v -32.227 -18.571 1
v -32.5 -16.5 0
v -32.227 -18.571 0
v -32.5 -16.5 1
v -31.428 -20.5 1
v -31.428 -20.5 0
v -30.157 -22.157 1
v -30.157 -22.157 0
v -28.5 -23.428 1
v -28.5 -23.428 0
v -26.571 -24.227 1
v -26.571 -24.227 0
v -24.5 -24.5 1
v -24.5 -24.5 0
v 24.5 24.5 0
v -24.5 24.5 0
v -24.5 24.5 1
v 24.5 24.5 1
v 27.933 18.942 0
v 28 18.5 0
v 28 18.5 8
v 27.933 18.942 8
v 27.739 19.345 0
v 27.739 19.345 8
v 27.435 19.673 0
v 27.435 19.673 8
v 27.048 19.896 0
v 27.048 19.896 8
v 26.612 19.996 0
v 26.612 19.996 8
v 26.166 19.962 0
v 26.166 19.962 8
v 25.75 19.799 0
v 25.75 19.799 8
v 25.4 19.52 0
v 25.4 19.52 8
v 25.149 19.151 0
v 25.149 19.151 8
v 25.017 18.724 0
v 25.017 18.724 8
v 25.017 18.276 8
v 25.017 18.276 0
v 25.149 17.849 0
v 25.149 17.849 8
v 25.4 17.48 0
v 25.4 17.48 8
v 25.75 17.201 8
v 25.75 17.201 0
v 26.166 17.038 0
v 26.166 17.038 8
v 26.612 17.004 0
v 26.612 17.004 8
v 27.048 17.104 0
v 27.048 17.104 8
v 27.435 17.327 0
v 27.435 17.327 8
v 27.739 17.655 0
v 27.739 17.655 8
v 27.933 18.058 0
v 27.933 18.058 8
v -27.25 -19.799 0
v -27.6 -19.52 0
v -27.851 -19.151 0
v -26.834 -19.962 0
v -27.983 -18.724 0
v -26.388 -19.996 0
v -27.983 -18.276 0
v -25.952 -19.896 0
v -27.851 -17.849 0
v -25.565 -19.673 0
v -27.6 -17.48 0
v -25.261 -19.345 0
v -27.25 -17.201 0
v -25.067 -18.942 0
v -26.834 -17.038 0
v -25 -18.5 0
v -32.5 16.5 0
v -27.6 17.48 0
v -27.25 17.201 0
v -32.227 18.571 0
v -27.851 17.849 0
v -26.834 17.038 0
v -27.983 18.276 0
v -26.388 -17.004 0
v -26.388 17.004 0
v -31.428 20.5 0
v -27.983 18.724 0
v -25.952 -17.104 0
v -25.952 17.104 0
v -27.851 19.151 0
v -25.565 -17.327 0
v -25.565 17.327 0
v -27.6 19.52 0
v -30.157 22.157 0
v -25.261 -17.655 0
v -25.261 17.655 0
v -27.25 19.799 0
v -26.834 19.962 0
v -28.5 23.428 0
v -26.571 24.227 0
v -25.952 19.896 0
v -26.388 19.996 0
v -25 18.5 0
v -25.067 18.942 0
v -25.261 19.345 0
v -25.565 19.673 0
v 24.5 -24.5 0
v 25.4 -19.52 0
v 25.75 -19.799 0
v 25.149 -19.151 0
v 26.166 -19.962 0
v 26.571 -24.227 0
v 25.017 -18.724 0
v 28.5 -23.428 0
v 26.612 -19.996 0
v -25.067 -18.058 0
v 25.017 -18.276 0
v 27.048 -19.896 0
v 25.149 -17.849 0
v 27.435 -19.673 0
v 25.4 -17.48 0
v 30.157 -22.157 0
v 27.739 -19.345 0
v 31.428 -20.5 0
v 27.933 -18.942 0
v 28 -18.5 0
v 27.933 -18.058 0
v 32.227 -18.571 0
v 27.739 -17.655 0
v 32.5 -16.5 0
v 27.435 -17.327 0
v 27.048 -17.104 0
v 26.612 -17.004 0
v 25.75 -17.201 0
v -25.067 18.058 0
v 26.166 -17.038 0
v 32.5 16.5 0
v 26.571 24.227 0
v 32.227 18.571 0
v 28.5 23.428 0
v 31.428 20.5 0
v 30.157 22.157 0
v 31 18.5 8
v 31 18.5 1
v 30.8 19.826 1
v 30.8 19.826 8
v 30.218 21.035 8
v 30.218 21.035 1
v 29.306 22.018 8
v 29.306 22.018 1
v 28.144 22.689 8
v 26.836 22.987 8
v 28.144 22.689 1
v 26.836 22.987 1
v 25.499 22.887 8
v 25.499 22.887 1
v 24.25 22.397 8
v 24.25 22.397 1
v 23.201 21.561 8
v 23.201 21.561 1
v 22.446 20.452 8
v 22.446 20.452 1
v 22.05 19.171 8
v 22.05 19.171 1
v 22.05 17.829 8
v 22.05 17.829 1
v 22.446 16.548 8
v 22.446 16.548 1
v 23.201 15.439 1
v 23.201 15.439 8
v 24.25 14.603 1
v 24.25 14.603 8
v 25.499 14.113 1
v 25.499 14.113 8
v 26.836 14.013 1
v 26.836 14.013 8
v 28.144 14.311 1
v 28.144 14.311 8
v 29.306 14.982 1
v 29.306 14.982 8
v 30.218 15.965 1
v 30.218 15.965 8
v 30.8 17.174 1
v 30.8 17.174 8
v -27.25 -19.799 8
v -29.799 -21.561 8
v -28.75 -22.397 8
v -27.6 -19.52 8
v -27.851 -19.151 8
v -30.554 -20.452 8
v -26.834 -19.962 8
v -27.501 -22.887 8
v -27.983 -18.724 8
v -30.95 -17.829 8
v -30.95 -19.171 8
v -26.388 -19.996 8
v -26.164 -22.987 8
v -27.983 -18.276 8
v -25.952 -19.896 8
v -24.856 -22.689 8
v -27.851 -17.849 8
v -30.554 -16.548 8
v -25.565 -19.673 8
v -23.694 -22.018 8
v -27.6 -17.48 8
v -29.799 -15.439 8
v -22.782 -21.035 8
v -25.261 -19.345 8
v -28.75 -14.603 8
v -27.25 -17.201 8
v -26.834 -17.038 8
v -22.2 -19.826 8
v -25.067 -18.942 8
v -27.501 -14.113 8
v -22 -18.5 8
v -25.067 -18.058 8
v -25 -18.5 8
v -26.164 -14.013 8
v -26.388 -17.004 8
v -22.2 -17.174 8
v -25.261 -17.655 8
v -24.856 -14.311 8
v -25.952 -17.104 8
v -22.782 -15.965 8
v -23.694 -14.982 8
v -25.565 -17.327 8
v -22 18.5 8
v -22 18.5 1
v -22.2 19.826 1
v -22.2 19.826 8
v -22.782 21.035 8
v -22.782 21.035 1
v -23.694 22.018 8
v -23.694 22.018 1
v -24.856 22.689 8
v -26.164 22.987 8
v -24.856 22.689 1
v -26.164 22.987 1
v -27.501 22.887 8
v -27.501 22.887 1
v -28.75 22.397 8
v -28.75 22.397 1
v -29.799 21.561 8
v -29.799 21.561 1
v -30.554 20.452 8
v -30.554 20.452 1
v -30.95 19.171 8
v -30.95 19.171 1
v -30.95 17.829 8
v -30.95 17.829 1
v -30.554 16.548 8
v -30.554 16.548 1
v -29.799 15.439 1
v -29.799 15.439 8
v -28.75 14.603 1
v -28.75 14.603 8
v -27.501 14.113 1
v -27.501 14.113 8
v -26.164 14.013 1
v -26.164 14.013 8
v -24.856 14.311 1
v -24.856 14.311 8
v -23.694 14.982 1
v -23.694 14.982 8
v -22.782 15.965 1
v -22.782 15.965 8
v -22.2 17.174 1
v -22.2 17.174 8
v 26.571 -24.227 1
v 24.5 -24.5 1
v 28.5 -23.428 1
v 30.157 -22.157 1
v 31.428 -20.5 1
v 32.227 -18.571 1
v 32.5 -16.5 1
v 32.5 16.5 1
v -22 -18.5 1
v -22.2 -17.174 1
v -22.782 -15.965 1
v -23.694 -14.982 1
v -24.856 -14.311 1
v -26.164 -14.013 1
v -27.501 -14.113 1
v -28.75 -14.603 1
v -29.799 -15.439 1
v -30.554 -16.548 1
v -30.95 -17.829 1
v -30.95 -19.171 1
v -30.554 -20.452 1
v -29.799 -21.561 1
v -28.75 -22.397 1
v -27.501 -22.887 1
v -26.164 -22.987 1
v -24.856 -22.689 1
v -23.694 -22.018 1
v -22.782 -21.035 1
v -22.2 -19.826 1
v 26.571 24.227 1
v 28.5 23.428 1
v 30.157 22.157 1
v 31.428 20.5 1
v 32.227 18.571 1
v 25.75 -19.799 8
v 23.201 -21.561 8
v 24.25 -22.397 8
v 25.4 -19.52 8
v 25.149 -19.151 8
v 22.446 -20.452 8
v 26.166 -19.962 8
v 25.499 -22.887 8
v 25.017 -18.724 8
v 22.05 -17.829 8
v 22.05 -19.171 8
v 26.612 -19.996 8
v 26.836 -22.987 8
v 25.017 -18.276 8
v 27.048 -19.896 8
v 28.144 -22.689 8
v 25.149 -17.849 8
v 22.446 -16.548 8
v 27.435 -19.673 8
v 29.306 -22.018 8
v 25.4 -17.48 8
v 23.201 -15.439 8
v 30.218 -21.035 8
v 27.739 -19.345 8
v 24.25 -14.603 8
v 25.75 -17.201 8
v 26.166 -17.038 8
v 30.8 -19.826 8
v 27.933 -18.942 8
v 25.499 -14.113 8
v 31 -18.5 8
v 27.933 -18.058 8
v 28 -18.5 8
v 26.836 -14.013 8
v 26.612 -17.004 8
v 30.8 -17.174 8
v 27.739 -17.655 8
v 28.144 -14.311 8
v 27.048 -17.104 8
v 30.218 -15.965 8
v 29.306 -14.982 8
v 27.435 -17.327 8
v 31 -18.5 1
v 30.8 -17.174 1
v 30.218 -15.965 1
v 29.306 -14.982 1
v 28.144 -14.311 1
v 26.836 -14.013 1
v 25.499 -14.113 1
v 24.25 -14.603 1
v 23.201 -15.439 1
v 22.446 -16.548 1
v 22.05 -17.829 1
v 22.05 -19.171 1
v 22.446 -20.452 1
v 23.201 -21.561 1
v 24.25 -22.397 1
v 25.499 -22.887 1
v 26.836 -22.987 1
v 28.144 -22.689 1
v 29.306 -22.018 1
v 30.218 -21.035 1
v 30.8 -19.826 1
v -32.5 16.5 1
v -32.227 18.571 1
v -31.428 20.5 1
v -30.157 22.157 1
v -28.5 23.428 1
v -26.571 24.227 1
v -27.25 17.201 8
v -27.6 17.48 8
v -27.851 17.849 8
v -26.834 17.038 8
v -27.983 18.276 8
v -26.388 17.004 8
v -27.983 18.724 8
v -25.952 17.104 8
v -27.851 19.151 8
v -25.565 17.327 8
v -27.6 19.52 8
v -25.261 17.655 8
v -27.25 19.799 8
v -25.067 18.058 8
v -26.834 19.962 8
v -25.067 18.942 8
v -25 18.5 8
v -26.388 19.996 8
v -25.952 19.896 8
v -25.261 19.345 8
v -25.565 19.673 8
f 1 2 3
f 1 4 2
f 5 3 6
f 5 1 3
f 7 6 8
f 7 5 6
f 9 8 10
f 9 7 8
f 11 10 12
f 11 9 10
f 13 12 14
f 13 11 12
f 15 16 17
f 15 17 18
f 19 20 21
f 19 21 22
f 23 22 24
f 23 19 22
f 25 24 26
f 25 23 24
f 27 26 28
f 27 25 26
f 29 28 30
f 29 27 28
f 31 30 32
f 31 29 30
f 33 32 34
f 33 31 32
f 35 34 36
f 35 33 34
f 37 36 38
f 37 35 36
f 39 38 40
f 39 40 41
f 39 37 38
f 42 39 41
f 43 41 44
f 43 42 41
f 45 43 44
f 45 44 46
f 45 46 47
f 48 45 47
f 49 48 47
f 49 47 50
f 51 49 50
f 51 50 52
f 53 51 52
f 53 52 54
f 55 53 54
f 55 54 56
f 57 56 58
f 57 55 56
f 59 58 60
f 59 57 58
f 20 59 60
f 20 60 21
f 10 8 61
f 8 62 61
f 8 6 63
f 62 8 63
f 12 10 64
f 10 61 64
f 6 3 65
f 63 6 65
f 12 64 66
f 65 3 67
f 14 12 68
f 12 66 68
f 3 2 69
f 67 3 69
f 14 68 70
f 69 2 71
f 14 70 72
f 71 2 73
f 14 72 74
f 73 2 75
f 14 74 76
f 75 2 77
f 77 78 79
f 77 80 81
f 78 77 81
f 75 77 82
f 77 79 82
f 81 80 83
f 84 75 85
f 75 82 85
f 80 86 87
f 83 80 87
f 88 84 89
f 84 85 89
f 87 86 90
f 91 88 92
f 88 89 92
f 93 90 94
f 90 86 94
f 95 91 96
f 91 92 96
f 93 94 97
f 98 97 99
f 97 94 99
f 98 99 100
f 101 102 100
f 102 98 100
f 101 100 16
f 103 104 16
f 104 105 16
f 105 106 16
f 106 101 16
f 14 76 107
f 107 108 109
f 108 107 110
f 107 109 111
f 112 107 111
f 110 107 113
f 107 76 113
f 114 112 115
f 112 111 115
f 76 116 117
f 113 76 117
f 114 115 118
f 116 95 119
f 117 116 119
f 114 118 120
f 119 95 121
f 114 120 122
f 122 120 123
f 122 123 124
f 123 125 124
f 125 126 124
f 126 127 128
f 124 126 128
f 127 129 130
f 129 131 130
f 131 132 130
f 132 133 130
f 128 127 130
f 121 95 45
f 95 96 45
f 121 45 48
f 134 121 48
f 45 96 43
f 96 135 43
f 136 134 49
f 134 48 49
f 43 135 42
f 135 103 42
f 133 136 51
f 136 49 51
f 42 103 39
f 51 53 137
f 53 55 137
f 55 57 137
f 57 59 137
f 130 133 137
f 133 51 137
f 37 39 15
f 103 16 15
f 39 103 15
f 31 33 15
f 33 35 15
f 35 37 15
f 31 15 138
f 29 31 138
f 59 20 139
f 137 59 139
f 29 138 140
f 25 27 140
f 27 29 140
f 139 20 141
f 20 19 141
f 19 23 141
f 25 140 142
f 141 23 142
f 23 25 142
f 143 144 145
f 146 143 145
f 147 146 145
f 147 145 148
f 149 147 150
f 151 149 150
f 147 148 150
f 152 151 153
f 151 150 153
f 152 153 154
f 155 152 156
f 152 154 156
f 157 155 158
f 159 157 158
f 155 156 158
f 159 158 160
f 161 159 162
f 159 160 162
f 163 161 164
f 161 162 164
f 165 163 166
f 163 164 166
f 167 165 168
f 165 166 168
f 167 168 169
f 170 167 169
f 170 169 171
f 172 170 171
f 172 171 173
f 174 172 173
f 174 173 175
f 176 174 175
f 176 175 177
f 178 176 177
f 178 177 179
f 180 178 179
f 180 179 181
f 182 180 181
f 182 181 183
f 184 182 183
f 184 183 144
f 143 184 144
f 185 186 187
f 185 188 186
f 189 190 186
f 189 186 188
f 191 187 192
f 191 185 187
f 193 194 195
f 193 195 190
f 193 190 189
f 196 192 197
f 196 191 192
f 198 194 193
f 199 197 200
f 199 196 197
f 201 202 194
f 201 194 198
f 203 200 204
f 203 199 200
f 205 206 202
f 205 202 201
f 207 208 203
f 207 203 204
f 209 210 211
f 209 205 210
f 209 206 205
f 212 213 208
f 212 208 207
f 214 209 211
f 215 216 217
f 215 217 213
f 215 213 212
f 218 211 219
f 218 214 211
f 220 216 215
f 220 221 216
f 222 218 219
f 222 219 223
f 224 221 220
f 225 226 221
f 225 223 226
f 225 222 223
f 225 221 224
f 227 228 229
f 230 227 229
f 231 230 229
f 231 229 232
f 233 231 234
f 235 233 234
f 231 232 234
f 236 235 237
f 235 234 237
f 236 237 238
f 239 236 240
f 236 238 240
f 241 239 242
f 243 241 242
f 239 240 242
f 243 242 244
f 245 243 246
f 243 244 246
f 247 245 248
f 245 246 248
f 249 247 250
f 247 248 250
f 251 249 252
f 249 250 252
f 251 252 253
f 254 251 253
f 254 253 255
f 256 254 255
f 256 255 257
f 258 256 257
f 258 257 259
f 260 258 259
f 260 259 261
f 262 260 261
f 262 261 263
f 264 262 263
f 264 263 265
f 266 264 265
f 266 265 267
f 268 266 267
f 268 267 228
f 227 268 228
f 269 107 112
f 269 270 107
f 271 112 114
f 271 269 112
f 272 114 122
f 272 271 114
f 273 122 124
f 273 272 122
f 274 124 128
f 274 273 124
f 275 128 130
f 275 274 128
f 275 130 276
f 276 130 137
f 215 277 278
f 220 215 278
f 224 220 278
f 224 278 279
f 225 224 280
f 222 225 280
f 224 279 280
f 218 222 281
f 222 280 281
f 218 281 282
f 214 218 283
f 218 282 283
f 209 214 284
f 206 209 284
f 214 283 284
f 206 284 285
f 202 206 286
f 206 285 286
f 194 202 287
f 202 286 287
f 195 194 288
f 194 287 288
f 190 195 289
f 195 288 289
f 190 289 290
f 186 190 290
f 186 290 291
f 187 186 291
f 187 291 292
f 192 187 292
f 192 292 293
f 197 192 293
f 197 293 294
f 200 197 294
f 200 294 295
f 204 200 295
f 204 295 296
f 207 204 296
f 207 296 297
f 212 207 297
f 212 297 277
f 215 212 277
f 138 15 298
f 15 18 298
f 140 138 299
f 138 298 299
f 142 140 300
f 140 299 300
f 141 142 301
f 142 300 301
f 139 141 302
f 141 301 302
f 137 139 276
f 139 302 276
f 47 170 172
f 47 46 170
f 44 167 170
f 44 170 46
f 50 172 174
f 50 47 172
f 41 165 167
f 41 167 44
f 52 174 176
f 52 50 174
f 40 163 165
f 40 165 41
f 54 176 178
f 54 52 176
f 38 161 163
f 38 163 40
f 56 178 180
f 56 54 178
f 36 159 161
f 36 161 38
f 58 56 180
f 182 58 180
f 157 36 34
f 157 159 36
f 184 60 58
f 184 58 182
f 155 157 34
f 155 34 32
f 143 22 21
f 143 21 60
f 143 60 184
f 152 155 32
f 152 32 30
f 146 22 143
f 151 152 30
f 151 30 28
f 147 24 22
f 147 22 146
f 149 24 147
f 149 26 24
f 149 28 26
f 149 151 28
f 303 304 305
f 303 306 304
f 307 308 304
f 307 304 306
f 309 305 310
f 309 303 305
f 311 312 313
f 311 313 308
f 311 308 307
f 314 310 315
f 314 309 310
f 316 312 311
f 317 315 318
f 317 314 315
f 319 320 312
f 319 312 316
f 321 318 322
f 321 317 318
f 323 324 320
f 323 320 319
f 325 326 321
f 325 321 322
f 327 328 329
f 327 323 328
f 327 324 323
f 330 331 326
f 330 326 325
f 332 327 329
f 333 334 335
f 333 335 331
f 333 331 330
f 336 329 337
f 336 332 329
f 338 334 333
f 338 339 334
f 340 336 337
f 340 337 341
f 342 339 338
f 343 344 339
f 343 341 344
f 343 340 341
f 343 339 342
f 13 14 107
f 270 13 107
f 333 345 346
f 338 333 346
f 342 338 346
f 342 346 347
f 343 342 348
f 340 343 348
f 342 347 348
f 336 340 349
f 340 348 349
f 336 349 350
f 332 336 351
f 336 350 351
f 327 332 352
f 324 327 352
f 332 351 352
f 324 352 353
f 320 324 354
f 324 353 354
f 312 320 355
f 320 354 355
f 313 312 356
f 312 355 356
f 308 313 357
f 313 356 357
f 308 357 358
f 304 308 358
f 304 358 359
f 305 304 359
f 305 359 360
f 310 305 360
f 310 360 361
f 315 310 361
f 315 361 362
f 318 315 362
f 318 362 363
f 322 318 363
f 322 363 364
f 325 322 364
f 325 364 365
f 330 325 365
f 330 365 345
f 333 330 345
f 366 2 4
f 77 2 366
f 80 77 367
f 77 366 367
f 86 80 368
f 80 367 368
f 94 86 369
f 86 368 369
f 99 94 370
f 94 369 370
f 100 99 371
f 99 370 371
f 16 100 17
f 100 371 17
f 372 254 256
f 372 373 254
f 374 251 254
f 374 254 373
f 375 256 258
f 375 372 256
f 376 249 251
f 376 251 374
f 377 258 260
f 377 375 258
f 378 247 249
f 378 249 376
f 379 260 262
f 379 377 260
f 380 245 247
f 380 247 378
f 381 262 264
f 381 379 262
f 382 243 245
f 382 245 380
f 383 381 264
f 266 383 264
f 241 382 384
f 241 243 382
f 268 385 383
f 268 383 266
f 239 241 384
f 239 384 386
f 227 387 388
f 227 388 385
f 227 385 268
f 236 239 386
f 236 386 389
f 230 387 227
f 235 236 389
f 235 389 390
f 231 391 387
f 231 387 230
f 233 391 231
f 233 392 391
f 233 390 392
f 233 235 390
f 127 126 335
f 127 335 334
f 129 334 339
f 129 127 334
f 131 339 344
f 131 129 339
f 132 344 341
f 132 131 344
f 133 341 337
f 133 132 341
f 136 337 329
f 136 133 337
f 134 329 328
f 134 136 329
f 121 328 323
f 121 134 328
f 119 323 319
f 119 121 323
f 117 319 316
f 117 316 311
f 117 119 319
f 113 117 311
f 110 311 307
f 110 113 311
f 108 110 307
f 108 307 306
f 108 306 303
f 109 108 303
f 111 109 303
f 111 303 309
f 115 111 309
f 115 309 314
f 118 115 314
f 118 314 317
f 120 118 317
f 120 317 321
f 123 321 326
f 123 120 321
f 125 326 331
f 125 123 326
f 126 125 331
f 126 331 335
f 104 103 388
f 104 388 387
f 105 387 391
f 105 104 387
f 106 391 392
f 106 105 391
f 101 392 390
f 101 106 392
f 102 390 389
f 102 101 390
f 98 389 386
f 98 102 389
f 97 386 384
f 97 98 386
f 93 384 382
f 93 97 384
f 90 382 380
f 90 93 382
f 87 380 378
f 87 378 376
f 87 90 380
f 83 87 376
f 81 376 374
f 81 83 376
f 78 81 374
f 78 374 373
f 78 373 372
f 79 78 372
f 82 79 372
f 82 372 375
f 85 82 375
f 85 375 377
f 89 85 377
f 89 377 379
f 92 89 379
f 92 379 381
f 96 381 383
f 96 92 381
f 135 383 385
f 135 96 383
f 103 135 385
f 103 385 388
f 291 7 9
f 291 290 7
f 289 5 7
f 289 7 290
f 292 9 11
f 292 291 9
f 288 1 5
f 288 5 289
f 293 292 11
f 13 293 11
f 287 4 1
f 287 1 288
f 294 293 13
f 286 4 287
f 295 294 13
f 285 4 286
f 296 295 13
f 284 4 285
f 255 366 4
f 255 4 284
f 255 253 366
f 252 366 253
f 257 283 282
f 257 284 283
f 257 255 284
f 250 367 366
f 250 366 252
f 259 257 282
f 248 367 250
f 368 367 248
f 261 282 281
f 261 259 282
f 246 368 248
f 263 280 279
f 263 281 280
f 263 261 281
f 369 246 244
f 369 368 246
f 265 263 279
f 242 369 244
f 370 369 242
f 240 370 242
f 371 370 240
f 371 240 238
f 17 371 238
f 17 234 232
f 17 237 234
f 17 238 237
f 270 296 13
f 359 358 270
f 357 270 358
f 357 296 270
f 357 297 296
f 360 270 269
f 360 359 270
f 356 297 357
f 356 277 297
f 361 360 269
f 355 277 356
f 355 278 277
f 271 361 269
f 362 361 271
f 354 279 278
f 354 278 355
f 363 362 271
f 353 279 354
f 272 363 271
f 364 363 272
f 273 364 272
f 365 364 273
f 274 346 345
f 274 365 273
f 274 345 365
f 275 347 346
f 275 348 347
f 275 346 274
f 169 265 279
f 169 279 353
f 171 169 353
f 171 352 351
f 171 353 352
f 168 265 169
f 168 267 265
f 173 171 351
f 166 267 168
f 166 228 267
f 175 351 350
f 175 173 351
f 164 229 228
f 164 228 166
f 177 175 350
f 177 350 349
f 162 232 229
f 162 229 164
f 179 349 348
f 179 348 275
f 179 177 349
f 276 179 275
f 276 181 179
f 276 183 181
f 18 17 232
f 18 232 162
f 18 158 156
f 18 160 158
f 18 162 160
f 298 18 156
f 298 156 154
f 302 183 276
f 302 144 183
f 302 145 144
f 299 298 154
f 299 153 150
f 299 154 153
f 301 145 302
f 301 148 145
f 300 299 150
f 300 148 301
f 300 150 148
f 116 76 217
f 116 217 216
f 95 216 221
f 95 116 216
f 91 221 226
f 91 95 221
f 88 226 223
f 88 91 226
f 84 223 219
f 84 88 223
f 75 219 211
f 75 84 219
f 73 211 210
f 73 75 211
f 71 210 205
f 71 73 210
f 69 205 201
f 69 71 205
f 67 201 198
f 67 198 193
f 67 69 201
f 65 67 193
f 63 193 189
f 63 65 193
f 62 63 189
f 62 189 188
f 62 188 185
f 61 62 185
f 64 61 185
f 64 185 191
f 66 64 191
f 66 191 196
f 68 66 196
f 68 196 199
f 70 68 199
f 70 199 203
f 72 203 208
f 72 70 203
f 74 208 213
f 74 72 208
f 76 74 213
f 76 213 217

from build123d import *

# Parameters (mm, degrees)
F0_W     = 65
F0_H     = 49
F0_R     = 4.5
F1_DEPTH = 1
F0_R_2   = 1.5
F3_DEPTH = 8
F4_R     = 8


with BuildPart() as f1:
    # F0 (on Top) → F1 (new body)
    with BuildSketch(Plane.XY):
        Rectangle(F0_W, F0_H)
        with Locations((-26.5, -18.5)):
            Circle(F0_R, mode=Mode.SUBTRACT)
        with Locations((26.5, -18.5)):
            Circle(F0_R, mode=Mode.SUBTRACT)
        with Locations((-26.5, 18.5)):
            Circle(F0_R, mode=Mode.SUBTRACT)
        with Locations((26.5, 18.5)):
            Circle(F0_R, mode=Mode.SUBTRACT)
    extrude(amount=F1_DEPTH)

    # F0 (on Top) → F3 (join)
    with BuildSketch(Plane.XY):
        with Locations((26.5, 18.5)):
            Circle(F0_R)
        with Locations((26.5, 18.5)):
            Circle(F0_R_2, mode=Mode.SUBTRACT)
        with Locations((-26.5, -18.5)):
            Circle(F0_R)
        with Locations((-26.5, -18.5)):
            Circle(F0_R_2, mode=Mode.SUBTRACT)
        with Locations((-26.5, 18.5)):
            Circle(F0_R)
        with Locations((-26.5, 18.5)):
            Circle(F0_R_2, mode=Mode.SUBTRACT)
        with Locations((26.5, -18.5)):
            Circle(F0_R)
        with Locations((26.5, -18.5)):
            Circle(F0_R_2, mode=Mode.SUBTRACT)
    extrude(amount=F3_DEPTH)

    # F4
    f4_edges = [f1.edges().sort_by_distance(p)[0] for p in [
        (32.5, -24.5, 0.5),
        (32.5, 24.5, 0.5),
        (-32.5, -24.5, 0.5),
        (-32.5, 24.5, 0.5),
    ]]
    fillet(f4_edges, radius=F4_R)


solid = f1.part
